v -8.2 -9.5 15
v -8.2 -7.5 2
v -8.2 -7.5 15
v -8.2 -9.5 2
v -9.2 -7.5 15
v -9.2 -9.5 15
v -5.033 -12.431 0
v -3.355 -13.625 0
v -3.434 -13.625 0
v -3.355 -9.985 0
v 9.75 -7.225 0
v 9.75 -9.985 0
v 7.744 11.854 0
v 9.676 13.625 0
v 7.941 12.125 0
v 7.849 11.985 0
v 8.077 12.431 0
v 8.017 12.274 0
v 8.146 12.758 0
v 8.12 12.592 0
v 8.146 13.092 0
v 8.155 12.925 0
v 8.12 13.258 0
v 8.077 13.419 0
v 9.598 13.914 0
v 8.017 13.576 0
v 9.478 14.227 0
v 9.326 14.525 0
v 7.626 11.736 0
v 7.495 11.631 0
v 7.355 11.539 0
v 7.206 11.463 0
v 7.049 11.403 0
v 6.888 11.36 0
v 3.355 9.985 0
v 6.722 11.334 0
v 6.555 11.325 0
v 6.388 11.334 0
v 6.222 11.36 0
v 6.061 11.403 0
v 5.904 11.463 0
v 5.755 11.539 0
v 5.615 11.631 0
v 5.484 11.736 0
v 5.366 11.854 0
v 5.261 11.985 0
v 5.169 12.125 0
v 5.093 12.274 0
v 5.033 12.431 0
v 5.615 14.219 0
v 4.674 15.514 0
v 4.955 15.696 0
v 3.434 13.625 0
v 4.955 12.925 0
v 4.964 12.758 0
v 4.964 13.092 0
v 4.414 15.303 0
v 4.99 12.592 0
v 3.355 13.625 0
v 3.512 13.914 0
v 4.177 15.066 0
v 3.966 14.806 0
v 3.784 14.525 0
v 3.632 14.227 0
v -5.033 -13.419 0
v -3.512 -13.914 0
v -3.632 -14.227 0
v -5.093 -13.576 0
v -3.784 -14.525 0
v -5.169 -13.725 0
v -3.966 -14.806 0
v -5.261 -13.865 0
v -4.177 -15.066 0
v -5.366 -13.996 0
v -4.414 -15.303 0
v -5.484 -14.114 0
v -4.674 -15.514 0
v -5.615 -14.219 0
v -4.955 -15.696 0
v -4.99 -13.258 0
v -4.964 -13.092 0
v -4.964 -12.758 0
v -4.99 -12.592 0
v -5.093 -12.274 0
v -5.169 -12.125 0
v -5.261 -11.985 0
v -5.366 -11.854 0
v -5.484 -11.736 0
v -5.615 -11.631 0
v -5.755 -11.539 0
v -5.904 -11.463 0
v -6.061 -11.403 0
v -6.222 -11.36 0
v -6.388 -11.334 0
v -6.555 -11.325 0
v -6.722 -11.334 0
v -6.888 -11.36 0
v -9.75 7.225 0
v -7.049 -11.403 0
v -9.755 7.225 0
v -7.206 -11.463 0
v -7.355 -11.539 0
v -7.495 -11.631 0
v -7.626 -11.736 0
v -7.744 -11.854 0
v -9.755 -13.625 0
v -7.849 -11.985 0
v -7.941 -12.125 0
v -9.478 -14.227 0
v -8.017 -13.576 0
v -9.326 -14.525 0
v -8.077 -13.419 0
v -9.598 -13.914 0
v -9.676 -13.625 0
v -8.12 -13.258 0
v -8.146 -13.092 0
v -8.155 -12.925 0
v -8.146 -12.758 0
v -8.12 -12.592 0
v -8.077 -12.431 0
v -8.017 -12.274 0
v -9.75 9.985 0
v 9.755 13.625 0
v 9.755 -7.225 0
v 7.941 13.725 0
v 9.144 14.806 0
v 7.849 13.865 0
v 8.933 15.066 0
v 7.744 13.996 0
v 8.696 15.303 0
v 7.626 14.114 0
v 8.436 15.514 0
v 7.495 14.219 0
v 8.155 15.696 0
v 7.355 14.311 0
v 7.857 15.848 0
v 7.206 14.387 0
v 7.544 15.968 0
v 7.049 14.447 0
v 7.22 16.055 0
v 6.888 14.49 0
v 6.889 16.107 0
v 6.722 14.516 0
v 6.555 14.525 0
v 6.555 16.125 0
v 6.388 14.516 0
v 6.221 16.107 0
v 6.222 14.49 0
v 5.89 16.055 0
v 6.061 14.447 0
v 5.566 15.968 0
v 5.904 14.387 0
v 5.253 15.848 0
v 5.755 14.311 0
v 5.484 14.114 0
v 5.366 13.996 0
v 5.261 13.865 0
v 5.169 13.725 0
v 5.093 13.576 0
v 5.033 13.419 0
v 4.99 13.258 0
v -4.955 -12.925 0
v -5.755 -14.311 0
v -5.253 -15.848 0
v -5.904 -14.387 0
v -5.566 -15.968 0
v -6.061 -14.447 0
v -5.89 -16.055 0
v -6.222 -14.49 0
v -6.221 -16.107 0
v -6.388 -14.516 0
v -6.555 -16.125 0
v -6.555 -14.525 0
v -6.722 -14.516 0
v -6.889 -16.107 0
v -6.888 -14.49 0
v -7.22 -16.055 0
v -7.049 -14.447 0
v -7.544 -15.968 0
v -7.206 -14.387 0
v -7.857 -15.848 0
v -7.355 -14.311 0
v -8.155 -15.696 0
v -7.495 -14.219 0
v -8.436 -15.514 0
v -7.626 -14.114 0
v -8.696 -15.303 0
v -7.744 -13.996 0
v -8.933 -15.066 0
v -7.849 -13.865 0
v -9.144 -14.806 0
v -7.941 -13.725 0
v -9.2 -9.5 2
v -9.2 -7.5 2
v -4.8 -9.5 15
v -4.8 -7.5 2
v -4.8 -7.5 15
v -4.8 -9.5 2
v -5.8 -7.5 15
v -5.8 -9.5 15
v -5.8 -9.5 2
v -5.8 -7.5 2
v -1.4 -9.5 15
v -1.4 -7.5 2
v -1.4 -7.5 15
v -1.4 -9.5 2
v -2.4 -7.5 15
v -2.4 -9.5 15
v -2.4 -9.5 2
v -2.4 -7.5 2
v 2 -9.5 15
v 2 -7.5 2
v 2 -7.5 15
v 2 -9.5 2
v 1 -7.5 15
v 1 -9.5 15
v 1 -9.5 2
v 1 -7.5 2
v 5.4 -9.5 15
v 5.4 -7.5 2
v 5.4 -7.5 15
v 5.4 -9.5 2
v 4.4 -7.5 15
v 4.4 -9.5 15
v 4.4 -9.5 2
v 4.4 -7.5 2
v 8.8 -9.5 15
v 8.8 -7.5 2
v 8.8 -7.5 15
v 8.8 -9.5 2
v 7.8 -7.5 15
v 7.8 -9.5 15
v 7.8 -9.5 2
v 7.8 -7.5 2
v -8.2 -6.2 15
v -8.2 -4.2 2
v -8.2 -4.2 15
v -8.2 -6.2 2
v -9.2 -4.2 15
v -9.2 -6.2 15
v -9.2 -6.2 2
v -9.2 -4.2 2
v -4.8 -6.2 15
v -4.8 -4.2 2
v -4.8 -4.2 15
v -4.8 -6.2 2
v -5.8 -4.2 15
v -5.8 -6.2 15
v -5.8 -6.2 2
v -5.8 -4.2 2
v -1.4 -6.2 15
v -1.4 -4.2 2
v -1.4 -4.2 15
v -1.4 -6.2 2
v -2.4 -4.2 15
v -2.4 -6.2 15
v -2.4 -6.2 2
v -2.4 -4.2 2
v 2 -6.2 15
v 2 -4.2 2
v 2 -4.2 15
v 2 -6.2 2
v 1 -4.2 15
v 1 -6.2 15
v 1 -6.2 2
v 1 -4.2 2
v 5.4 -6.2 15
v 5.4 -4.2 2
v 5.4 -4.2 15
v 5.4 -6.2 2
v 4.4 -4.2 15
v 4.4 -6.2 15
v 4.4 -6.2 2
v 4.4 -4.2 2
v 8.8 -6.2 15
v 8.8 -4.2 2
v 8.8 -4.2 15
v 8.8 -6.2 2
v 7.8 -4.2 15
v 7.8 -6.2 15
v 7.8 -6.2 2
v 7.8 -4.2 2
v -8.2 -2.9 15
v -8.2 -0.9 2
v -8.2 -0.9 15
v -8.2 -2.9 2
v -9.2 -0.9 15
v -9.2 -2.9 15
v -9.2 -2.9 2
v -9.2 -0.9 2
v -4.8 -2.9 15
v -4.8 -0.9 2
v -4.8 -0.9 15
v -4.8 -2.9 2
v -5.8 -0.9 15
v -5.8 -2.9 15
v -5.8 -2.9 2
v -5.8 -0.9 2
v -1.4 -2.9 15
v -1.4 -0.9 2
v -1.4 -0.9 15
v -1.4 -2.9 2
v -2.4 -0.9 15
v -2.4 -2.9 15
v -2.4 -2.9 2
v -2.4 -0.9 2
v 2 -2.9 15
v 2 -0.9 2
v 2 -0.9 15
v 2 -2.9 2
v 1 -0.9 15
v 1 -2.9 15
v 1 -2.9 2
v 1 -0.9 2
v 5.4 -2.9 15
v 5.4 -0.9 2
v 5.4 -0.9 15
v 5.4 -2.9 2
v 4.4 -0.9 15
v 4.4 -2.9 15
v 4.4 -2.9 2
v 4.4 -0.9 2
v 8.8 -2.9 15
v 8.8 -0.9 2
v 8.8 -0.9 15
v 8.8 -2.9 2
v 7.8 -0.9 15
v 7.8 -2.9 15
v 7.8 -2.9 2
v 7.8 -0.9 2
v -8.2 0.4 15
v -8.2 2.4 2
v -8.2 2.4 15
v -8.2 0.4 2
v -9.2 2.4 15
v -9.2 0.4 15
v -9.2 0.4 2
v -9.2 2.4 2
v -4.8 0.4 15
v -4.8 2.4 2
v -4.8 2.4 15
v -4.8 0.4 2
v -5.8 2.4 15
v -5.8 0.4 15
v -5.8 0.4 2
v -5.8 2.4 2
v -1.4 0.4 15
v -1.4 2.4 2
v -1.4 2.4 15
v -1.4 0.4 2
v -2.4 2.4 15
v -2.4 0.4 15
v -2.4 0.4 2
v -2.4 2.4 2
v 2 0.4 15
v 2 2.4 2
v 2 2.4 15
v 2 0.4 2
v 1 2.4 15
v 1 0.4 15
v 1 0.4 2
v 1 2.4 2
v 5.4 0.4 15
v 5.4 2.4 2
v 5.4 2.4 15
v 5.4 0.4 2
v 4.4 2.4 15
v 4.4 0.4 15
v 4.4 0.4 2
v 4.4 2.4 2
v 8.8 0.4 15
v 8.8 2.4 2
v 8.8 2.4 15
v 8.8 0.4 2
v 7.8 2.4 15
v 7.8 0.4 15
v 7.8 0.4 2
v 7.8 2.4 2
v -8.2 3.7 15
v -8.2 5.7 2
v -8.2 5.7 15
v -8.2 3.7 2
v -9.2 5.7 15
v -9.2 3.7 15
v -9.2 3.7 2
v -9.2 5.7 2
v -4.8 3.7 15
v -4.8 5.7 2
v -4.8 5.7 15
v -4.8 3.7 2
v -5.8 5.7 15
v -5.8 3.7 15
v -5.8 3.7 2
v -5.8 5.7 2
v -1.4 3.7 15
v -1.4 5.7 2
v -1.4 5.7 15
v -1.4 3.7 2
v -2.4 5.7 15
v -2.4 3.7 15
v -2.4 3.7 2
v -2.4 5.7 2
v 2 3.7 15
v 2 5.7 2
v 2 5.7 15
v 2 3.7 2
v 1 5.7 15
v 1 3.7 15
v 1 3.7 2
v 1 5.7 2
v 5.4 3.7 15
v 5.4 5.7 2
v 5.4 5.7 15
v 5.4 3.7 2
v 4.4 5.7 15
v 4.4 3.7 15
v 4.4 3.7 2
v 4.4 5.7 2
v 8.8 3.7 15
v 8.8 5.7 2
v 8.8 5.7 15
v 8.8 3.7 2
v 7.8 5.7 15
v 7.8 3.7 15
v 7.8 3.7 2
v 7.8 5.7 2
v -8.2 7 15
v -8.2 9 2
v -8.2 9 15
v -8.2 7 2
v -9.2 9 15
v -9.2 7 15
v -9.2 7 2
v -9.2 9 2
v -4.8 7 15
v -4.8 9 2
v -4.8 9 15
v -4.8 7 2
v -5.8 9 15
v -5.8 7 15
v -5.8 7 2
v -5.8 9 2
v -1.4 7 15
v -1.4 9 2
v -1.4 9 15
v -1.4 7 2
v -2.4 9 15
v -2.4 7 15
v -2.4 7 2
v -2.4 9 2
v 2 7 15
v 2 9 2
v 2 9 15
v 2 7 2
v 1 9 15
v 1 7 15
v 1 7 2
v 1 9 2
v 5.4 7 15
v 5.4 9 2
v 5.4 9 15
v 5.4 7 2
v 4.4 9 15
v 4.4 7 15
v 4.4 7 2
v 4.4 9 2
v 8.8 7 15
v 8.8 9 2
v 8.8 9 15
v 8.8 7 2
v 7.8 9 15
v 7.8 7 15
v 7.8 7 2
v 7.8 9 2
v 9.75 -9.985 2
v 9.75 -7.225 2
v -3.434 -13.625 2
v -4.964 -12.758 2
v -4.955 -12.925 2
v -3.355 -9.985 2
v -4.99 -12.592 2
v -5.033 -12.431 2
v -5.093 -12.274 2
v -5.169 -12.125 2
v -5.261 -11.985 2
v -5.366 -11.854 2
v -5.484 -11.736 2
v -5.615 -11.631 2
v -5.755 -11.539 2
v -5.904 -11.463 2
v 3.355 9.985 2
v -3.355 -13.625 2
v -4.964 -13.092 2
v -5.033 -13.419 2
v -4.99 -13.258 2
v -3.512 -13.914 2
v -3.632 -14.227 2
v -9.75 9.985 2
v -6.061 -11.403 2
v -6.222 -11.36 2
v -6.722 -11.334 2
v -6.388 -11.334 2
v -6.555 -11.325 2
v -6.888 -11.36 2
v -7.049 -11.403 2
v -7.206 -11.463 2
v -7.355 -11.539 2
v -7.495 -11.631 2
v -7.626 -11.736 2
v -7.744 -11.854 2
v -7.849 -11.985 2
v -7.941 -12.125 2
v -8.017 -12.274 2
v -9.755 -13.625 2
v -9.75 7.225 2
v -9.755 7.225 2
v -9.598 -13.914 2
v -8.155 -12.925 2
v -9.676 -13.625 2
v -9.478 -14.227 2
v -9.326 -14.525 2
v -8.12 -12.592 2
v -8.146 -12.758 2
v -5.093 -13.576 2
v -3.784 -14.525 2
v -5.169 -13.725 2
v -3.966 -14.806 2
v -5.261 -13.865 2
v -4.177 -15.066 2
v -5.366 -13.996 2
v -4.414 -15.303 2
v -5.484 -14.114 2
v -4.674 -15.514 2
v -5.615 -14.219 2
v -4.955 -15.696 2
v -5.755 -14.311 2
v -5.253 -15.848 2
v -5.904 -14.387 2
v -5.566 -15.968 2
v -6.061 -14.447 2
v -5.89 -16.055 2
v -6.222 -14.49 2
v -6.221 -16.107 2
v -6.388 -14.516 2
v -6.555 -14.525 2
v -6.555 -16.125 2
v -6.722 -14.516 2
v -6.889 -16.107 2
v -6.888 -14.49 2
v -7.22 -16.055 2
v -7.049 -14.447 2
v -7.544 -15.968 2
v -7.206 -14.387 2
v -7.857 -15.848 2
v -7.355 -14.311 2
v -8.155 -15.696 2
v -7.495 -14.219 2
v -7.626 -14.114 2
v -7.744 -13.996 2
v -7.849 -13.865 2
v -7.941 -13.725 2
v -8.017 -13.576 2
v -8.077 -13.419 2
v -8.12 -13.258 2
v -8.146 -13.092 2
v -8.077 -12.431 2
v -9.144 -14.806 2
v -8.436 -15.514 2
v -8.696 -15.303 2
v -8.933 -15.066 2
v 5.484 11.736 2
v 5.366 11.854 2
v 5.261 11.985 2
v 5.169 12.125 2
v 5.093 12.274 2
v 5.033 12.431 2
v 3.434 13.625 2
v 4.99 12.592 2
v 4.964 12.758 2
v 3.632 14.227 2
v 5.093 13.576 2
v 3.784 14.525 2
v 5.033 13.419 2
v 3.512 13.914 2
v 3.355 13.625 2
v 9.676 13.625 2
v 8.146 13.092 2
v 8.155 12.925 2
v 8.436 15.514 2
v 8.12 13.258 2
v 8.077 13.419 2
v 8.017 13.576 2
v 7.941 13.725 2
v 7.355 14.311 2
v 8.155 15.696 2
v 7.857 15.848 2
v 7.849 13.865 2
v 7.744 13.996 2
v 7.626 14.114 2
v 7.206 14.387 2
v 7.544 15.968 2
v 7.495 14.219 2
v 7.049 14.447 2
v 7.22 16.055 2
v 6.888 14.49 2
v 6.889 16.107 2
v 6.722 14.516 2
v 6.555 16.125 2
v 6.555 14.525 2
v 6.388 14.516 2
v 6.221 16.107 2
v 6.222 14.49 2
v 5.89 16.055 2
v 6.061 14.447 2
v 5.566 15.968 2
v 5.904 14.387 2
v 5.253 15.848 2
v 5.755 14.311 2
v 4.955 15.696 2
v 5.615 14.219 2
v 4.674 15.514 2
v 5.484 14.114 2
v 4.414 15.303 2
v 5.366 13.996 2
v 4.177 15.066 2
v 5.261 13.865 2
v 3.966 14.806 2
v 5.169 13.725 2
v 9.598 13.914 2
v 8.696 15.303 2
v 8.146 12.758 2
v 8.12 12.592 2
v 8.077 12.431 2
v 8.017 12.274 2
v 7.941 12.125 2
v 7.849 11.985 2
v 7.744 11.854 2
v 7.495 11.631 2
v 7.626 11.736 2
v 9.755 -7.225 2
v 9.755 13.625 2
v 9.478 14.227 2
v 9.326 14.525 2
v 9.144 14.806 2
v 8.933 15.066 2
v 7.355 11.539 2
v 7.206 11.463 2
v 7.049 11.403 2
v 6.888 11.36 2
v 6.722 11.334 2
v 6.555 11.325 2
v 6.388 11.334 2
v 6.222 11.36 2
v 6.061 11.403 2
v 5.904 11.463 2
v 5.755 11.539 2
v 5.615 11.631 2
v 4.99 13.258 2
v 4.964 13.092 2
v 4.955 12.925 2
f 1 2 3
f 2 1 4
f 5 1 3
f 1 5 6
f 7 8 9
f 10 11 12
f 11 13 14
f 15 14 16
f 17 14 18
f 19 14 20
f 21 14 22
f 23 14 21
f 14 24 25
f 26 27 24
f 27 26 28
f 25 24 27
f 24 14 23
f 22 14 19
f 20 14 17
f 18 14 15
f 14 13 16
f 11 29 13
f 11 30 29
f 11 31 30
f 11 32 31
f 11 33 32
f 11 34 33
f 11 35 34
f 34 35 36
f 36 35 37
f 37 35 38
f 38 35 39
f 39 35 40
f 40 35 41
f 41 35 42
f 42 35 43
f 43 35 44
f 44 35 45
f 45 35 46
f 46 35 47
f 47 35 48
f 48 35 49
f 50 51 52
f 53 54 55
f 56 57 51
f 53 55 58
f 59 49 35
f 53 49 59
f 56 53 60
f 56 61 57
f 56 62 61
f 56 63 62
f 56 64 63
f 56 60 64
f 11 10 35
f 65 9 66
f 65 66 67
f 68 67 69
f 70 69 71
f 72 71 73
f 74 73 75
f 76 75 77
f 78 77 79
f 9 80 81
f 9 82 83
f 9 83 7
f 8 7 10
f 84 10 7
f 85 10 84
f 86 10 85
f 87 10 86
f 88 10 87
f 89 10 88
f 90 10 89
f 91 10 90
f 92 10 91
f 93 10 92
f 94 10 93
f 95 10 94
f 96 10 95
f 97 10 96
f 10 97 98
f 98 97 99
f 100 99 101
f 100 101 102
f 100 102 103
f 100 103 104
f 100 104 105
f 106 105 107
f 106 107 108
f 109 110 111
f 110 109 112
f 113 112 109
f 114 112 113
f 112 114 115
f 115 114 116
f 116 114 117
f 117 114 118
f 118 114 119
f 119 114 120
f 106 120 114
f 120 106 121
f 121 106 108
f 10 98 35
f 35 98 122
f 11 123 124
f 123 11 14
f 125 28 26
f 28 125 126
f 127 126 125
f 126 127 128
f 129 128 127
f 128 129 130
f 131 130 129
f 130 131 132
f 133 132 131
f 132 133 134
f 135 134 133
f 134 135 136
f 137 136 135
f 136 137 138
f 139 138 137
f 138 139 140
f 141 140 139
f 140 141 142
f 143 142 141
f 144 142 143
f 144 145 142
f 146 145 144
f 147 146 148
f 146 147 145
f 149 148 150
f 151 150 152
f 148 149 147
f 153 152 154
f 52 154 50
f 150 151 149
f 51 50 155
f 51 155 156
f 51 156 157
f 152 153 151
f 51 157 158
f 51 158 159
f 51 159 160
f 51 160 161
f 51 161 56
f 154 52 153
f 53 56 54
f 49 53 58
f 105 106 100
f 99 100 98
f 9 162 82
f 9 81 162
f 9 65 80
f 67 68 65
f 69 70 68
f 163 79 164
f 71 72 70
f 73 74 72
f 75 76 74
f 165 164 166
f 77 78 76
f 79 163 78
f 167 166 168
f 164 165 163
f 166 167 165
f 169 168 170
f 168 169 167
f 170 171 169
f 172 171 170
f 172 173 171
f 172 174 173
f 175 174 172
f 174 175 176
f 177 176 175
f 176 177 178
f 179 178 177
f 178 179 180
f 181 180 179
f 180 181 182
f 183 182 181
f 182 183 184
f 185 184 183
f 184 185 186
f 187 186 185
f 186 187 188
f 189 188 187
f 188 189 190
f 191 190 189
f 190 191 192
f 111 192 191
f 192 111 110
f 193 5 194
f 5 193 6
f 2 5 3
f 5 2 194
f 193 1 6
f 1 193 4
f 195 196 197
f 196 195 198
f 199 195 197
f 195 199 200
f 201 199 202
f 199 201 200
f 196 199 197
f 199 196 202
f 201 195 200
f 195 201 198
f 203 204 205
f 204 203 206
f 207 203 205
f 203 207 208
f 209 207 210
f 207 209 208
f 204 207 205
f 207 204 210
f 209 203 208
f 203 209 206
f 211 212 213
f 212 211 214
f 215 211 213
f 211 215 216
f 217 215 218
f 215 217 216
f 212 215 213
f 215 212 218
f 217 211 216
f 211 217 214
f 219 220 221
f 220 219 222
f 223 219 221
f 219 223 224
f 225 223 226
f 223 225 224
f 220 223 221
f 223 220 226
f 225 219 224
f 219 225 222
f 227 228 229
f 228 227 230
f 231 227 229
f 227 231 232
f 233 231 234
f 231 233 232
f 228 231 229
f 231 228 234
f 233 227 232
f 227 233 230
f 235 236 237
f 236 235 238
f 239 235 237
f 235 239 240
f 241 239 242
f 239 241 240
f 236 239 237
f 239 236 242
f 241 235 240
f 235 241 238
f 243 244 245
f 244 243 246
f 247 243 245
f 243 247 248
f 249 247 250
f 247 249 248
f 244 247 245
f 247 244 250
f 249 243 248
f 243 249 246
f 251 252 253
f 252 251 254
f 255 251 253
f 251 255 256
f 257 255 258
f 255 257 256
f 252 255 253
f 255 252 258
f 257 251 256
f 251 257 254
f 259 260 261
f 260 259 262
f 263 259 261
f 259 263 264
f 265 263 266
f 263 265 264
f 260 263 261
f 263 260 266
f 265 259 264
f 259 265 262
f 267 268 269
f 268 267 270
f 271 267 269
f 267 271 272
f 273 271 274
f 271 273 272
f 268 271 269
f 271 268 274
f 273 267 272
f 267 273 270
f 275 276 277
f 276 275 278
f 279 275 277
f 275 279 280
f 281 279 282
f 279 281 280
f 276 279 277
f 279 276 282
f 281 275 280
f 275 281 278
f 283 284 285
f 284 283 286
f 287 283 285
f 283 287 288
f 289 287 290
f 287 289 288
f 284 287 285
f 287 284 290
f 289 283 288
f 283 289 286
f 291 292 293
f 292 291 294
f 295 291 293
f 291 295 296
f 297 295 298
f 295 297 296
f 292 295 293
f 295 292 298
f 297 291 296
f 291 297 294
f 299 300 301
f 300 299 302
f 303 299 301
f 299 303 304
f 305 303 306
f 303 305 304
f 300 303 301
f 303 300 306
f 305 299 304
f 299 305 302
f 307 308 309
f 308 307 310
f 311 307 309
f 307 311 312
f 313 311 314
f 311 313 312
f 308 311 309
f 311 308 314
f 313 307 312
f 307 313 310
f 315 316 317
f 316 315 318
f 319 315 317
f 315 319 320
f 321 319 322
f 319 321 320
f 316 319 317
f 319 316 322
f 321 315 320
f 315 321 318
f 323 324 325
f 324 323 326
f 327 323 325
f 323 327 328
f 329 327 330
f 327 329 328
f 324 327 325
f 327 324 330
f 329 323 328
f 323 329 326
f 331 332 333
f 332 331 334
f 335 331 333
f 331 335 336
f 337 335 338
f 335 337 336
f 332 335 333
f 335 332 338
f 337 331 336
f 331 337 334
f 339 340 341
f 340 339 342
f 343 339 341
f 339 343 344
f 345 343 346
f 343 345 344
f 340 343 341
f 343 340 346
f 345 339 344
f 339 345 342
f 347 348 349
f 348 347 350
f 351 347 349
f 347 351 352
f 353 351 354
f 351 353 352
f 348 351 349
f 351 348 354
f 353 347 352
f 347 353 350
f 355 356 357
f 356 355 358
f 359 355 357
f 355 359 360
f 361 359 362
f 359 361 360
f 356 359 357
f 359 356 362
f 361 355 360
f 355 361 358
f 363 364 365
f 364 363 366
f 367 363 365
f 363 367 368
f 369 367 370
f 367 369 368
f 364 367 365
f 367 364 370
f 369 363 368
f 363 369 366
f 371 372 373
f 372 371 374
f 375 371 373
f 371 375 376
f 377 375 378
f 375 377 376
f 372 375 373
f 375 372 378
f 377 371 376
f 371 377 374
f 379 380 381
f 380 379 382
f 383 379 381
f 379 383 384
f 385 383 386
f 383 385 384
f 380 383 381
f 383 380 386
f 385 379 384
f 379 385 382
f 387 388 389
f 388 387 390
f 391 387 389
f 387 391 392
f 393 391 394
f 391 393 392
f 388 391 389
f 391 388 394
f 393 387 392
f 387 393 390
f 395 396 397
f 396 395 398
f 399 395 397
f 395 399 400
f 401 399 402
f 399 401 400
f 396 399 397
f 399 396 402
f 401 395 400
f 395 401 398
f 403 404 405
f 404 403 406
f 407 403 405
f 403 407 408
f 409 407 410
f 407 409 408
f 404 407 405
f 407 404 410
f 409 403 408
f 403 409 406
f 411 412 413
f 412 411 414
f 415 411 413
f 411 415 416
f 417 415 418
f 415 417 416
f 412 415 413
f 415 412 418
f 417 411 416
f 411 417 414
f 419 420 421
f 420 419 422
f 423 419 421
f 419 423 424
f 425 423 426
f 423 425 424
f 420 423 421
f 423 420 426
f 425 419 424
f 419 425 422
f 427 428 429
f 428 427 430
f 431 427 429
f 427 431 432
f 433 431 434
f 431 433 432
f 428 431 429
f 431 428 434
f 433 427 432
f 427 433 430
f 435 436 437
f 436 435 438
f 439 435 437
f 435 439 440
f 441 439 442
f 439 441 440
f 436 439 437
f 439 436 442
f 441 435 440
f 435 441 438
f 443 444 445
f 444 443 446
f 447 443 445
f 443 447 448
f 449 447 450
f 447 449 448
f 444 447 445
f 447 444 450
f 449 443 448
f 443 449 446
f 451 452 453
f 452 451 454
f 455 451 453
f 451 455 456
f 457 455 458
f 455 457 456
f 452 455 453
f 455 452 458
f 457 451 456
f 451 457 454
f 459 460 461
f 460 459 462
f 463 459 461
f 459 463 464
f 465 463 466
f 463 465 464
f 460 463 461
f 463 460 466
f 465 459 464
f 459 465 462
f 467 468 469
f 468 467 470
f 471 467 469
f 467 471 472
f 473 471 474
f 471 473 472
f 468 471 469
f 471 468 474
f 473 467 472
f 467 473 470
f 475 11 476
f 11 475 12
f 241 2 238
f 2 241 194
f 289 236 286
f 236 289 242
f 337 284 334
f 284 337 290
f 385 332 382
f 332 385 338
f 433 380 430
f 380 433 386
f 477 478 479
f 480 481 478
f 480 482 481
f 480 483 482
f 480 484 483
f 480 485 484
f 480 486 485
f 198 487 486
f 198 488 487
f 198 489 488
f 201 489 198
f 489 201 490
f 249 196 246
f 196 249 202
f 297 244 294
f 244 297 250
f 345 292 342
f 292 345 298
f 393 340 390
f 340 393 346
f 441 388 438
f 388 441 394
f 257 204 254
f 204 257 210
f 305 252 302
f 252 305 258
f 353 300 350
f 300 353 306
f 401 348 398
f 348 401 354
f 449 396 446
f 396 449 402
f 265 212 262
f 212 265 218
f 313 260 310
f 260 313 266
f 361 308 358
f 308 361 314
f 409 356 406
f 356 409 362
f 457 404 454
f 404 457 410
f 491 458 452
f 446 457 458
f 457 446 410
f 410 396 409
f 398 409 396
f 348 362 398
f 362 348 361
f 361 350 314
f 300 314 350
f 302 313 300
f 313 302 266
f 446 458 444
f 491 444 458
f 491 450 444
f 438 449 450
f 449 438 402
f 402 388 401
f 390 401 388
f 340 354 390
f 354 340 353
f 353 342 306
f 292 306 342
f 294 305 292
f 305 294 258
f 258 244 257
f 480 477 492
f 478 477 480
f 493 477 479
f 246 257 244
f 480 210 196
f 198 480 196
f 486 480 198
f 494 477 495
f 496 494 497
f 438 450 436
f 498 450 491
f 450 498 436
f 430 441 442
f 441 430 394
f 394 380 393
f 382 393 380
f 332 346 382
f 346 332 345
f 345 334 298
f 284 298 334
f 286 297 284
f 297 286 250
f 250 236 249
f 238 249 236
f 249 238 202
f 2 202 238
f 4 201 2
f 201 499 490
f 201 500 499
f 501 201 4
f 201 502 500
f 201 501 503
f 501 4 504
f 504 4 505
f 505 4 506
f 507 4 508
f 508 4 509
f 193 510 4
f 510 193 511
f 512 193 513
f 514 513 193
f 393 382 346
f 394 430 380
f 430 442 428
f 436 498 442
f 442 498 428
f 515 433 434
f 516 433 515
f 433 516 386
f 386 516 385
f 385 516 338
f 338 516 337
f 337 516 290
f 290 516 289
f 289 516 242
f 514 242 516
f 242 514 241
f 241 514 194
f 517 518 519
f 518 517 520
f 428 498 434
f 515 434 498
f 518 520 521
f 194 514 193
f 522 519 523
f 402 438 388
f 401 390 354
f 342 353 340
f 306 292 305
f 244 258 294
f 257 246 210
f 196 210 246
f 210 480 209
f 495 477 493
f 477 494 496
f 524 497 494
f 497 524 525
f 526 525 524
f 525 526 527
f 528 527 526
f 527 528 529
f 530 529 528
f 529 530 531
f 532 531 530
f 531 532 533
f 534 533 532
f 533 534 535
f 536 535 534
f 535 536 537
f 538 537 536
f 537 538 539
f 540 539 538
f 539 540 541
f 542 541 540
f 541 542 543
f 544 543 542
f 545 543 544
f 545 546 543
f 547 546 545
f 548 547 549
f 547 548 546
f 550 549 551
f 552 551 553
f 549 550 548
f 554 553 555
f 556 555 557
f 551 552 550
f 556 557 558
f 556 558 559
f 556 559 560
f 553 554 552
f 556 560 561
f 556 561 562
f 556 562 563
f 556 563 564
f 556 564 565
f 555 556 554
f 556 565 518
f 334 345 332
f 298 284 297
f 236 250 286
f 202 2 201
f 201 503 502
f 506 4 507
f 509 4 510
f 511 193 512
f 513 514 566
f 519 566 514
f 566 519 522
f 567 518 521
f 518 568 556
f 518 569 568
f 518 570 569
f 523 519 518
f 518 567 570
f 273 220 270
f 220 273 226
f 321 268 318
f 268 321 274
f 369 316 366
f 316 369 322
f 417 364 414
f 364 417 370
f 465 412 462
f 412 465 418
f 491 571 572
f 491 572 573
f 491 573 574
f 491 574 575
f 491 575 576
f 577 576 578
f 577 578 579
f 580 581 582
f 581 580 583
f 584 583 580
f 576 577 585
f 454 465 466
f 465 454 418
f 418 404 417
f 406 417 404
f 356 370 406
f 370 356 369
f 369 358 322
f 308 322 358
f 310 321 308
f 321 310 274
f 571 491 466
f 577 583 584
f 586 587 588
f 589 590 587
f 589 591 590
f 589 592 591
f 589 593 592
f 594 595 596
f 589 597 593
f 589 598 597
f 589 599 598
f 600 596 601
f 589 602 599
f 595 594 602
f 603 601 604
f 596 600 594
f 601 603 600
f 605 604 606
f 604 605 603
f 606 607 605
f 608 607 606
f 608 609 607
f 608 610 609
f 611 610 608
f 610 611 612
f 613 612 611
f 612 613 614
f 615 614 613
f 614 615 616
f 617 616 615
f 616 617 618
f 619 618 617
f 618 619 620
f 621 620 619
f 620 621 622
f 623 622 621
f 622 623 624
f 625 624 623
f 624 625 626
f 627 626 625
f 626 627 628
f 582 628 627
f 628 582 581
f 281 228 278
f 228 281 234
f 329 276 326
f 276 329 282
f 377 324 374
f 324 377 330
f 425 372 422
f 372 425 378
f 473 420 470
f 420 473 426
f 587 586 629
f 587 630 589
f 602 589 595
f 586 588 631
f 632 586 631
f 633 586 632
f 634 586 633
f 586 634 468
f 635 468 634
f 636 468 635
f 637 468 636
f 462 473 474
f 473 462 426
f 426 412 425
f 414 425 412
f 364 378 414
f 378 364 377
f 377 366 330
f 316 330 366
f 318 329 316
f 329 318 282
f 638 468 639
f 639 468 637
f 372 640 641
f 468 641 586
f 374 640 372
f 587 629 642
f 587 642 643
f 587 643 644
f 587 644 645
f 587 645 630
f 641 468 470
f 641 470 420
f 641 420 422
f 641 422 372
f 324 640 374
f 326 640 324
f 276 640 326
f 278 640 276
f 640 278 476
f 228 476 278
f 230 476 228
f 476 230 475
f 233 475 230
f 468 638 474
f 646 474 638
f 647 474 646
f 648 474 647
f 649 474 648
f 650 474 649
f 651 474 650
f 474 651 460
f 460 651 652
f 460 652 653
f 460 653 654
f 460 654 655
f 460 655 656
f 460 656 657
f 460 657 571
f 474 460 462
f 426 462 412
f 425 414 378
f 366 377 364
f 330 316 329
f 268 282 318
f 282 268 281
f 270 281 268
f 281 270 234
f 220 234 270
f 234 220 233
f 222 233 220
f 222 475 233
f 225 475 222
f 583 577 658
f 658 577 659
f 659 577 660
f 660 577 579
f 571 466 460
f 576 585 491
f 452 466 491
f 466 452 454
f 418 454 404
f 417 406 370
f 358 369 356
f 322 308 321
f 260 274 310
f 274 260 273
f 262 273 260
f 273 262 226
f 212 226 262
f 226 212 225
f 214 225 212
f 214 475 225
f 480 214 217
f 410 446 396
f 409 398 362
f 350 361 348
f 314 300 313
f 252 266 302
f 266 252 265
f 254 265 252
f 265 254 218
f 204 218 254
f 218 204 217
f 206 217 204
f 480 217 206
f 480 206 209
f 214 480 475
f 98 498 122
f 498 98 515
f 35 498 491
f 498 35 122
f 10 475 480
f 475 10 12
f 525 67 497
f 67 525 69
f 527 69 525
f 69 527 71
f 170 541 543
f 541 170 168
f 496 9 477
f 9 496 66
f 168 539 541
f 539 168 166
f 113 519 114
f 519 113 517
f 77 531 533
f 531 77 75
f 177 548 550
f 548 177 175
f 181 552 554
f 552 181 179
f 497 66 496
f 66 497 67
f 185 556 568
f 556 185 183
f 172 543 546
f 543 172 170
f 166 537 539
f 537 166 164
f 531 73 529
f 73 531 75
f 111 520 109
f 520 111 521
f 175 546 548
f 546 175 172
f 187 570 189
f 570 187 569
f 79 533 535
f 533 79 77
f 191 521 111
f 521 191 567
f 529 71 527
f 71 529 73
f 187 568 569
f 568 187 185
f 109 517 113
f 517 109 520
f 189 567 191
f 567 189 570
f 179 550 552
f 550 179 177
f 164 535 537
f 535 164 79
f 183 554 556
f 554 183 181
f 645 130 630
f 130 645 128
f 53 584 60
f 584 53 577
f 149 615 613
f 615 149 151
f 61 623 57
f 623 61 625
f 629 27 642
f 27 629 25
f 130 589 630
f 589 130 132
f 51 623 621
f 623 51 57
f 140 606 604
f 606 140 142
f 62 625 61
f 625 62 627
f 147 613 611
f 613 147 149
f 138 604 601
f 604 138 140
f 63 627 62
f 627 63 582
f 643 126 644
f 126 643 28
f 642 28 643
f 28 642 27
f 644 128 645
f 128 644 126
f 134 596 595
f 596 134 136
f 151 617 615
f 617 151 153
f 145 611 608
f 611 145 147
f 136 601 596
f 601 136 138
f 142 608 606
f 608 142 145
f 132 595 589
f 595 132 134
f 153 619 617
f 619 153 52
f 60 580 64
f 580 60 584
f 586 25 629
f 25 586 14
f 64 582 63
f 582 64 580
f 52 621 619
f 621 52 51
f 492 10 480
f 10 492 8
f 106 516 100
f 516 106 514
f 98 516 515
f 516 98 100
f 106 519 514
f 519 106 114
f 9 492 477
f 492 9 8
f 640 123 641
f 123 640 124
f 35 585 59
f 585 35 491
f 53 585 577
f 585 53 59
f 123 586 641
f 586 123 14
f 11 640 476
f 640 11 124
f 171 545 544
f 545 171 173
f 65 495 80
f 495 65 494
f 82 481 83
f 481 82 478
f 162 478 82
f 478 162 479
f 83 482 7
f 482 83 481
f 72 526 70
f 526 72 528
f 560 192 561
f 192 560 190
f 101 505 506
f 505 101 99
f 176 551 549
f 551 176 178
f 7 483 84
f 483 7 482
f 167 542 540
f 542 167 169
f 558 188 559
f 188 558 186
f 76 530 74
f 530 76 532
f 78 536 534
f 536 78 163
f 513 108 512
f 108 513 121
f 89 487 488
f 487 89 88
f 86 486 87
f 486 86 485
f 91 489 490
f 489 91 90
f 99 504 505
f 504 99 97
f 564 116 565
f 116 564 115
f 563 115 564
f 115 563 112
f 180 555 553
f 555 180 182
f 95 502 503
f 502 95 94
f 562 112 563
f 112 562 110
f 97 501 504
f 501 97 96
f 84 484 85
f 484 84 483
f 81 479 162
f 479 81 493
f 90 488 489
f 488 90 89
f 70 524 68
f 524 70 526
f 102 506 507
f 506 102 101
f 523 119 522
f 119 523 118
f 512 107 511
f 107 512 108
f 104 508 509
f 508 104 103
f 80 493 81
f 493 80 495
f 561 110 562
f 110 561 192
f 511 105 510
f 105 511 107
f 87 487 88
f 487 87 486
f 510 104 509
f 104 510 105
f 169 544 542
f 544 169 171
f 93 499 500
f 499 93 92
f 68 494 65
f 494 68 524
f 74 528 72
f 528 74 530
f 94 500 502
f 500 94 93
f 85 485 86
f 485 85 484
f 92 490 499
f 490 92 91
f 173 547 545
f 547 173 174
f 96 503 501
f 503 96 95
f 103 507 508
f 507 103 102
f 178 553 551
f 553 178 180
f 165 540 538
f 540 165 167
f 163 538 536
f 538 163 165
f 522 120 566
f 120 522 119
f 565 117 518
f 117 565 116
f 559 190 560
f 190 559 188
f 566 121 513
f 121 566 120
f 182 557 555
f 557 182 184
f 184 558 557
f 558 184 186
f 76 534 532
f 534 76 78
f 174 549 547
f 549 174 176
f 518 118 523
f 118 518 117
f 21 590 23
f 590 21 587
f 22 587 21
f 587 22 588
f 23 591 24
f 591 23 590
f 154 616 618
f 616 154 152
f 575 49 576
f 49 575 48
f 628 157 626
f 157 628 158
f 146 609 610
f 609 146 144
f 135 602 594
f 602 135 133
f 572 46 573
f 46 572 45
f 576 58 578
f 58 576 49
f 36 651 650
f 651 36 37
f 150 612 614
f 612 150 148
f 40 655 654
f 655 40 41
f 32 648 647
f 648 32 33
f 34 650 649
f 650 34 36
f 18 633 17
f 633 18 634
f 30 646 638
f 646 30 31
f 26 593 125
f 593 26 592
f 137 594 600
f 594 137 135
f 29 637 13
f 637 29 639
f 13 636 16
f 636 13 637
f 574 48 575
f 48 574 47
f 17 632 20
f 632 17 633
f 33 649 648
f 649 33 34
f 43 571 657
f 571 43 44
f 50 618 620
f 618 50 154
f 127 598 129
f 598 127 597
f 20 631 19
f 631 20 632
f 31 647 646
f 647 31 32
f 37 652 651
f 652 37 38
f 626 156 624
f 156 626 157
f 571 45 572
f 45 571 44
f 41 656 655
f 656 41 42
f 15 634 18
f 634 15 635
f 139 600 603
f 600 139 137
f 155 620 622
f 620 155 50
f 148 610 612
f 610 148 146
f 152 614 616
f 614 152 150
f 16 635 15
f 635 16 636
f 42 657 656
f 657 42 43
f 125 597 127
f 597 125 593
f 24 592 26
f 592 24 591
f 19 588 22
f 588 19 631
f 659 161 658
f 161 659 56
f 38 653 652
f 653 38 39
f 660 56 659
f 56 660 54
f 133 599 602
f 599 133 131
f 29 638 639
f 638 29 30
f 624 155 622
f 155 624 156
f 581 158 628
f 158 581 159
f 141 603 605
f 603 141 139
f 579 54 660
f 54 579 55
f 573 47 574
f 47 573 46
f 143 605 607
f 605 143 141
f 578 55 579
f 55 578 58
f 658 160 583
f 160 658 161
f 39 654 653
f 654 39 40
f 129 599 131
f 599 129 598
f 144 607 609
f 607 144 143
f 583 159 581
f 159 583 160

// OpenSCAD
$fn=60;
w=3.2;
h=2;
color("#404040") difference() {
        union() {
            translate([0,0,h/2]) cube([19.5,19.97,h], center=true);
            translate([-13.11/2, -25.85/2, 0]) cylinder(r=w, h=h);
            translate([13.11/2, 25.85/2, 0]) cylinder(r=w, h=h);
            translate([-13.11/2, -w, h/2]) cube([w *2, 25.85-5, h], center=true);
            translate([13.11/2, +w, h/2]) cube([w *2, 25.85-5, h], center=true);


            for (y=[-2:3]) {
                for (x=[-2:3]) {
                    translate([x*3.4-0.5-1.9, y*3.3-1-1.9]) cube([1, 2, 15]);
                }
            }
        }
        translate([-13.11/2, -25.85/2, -0.5]) cylinder(r=1.6, h=h+1);
        translate([13.11/2, 25.85/2, -0.5]) cylinder(r=1.6, h=h+1);
    }

        
